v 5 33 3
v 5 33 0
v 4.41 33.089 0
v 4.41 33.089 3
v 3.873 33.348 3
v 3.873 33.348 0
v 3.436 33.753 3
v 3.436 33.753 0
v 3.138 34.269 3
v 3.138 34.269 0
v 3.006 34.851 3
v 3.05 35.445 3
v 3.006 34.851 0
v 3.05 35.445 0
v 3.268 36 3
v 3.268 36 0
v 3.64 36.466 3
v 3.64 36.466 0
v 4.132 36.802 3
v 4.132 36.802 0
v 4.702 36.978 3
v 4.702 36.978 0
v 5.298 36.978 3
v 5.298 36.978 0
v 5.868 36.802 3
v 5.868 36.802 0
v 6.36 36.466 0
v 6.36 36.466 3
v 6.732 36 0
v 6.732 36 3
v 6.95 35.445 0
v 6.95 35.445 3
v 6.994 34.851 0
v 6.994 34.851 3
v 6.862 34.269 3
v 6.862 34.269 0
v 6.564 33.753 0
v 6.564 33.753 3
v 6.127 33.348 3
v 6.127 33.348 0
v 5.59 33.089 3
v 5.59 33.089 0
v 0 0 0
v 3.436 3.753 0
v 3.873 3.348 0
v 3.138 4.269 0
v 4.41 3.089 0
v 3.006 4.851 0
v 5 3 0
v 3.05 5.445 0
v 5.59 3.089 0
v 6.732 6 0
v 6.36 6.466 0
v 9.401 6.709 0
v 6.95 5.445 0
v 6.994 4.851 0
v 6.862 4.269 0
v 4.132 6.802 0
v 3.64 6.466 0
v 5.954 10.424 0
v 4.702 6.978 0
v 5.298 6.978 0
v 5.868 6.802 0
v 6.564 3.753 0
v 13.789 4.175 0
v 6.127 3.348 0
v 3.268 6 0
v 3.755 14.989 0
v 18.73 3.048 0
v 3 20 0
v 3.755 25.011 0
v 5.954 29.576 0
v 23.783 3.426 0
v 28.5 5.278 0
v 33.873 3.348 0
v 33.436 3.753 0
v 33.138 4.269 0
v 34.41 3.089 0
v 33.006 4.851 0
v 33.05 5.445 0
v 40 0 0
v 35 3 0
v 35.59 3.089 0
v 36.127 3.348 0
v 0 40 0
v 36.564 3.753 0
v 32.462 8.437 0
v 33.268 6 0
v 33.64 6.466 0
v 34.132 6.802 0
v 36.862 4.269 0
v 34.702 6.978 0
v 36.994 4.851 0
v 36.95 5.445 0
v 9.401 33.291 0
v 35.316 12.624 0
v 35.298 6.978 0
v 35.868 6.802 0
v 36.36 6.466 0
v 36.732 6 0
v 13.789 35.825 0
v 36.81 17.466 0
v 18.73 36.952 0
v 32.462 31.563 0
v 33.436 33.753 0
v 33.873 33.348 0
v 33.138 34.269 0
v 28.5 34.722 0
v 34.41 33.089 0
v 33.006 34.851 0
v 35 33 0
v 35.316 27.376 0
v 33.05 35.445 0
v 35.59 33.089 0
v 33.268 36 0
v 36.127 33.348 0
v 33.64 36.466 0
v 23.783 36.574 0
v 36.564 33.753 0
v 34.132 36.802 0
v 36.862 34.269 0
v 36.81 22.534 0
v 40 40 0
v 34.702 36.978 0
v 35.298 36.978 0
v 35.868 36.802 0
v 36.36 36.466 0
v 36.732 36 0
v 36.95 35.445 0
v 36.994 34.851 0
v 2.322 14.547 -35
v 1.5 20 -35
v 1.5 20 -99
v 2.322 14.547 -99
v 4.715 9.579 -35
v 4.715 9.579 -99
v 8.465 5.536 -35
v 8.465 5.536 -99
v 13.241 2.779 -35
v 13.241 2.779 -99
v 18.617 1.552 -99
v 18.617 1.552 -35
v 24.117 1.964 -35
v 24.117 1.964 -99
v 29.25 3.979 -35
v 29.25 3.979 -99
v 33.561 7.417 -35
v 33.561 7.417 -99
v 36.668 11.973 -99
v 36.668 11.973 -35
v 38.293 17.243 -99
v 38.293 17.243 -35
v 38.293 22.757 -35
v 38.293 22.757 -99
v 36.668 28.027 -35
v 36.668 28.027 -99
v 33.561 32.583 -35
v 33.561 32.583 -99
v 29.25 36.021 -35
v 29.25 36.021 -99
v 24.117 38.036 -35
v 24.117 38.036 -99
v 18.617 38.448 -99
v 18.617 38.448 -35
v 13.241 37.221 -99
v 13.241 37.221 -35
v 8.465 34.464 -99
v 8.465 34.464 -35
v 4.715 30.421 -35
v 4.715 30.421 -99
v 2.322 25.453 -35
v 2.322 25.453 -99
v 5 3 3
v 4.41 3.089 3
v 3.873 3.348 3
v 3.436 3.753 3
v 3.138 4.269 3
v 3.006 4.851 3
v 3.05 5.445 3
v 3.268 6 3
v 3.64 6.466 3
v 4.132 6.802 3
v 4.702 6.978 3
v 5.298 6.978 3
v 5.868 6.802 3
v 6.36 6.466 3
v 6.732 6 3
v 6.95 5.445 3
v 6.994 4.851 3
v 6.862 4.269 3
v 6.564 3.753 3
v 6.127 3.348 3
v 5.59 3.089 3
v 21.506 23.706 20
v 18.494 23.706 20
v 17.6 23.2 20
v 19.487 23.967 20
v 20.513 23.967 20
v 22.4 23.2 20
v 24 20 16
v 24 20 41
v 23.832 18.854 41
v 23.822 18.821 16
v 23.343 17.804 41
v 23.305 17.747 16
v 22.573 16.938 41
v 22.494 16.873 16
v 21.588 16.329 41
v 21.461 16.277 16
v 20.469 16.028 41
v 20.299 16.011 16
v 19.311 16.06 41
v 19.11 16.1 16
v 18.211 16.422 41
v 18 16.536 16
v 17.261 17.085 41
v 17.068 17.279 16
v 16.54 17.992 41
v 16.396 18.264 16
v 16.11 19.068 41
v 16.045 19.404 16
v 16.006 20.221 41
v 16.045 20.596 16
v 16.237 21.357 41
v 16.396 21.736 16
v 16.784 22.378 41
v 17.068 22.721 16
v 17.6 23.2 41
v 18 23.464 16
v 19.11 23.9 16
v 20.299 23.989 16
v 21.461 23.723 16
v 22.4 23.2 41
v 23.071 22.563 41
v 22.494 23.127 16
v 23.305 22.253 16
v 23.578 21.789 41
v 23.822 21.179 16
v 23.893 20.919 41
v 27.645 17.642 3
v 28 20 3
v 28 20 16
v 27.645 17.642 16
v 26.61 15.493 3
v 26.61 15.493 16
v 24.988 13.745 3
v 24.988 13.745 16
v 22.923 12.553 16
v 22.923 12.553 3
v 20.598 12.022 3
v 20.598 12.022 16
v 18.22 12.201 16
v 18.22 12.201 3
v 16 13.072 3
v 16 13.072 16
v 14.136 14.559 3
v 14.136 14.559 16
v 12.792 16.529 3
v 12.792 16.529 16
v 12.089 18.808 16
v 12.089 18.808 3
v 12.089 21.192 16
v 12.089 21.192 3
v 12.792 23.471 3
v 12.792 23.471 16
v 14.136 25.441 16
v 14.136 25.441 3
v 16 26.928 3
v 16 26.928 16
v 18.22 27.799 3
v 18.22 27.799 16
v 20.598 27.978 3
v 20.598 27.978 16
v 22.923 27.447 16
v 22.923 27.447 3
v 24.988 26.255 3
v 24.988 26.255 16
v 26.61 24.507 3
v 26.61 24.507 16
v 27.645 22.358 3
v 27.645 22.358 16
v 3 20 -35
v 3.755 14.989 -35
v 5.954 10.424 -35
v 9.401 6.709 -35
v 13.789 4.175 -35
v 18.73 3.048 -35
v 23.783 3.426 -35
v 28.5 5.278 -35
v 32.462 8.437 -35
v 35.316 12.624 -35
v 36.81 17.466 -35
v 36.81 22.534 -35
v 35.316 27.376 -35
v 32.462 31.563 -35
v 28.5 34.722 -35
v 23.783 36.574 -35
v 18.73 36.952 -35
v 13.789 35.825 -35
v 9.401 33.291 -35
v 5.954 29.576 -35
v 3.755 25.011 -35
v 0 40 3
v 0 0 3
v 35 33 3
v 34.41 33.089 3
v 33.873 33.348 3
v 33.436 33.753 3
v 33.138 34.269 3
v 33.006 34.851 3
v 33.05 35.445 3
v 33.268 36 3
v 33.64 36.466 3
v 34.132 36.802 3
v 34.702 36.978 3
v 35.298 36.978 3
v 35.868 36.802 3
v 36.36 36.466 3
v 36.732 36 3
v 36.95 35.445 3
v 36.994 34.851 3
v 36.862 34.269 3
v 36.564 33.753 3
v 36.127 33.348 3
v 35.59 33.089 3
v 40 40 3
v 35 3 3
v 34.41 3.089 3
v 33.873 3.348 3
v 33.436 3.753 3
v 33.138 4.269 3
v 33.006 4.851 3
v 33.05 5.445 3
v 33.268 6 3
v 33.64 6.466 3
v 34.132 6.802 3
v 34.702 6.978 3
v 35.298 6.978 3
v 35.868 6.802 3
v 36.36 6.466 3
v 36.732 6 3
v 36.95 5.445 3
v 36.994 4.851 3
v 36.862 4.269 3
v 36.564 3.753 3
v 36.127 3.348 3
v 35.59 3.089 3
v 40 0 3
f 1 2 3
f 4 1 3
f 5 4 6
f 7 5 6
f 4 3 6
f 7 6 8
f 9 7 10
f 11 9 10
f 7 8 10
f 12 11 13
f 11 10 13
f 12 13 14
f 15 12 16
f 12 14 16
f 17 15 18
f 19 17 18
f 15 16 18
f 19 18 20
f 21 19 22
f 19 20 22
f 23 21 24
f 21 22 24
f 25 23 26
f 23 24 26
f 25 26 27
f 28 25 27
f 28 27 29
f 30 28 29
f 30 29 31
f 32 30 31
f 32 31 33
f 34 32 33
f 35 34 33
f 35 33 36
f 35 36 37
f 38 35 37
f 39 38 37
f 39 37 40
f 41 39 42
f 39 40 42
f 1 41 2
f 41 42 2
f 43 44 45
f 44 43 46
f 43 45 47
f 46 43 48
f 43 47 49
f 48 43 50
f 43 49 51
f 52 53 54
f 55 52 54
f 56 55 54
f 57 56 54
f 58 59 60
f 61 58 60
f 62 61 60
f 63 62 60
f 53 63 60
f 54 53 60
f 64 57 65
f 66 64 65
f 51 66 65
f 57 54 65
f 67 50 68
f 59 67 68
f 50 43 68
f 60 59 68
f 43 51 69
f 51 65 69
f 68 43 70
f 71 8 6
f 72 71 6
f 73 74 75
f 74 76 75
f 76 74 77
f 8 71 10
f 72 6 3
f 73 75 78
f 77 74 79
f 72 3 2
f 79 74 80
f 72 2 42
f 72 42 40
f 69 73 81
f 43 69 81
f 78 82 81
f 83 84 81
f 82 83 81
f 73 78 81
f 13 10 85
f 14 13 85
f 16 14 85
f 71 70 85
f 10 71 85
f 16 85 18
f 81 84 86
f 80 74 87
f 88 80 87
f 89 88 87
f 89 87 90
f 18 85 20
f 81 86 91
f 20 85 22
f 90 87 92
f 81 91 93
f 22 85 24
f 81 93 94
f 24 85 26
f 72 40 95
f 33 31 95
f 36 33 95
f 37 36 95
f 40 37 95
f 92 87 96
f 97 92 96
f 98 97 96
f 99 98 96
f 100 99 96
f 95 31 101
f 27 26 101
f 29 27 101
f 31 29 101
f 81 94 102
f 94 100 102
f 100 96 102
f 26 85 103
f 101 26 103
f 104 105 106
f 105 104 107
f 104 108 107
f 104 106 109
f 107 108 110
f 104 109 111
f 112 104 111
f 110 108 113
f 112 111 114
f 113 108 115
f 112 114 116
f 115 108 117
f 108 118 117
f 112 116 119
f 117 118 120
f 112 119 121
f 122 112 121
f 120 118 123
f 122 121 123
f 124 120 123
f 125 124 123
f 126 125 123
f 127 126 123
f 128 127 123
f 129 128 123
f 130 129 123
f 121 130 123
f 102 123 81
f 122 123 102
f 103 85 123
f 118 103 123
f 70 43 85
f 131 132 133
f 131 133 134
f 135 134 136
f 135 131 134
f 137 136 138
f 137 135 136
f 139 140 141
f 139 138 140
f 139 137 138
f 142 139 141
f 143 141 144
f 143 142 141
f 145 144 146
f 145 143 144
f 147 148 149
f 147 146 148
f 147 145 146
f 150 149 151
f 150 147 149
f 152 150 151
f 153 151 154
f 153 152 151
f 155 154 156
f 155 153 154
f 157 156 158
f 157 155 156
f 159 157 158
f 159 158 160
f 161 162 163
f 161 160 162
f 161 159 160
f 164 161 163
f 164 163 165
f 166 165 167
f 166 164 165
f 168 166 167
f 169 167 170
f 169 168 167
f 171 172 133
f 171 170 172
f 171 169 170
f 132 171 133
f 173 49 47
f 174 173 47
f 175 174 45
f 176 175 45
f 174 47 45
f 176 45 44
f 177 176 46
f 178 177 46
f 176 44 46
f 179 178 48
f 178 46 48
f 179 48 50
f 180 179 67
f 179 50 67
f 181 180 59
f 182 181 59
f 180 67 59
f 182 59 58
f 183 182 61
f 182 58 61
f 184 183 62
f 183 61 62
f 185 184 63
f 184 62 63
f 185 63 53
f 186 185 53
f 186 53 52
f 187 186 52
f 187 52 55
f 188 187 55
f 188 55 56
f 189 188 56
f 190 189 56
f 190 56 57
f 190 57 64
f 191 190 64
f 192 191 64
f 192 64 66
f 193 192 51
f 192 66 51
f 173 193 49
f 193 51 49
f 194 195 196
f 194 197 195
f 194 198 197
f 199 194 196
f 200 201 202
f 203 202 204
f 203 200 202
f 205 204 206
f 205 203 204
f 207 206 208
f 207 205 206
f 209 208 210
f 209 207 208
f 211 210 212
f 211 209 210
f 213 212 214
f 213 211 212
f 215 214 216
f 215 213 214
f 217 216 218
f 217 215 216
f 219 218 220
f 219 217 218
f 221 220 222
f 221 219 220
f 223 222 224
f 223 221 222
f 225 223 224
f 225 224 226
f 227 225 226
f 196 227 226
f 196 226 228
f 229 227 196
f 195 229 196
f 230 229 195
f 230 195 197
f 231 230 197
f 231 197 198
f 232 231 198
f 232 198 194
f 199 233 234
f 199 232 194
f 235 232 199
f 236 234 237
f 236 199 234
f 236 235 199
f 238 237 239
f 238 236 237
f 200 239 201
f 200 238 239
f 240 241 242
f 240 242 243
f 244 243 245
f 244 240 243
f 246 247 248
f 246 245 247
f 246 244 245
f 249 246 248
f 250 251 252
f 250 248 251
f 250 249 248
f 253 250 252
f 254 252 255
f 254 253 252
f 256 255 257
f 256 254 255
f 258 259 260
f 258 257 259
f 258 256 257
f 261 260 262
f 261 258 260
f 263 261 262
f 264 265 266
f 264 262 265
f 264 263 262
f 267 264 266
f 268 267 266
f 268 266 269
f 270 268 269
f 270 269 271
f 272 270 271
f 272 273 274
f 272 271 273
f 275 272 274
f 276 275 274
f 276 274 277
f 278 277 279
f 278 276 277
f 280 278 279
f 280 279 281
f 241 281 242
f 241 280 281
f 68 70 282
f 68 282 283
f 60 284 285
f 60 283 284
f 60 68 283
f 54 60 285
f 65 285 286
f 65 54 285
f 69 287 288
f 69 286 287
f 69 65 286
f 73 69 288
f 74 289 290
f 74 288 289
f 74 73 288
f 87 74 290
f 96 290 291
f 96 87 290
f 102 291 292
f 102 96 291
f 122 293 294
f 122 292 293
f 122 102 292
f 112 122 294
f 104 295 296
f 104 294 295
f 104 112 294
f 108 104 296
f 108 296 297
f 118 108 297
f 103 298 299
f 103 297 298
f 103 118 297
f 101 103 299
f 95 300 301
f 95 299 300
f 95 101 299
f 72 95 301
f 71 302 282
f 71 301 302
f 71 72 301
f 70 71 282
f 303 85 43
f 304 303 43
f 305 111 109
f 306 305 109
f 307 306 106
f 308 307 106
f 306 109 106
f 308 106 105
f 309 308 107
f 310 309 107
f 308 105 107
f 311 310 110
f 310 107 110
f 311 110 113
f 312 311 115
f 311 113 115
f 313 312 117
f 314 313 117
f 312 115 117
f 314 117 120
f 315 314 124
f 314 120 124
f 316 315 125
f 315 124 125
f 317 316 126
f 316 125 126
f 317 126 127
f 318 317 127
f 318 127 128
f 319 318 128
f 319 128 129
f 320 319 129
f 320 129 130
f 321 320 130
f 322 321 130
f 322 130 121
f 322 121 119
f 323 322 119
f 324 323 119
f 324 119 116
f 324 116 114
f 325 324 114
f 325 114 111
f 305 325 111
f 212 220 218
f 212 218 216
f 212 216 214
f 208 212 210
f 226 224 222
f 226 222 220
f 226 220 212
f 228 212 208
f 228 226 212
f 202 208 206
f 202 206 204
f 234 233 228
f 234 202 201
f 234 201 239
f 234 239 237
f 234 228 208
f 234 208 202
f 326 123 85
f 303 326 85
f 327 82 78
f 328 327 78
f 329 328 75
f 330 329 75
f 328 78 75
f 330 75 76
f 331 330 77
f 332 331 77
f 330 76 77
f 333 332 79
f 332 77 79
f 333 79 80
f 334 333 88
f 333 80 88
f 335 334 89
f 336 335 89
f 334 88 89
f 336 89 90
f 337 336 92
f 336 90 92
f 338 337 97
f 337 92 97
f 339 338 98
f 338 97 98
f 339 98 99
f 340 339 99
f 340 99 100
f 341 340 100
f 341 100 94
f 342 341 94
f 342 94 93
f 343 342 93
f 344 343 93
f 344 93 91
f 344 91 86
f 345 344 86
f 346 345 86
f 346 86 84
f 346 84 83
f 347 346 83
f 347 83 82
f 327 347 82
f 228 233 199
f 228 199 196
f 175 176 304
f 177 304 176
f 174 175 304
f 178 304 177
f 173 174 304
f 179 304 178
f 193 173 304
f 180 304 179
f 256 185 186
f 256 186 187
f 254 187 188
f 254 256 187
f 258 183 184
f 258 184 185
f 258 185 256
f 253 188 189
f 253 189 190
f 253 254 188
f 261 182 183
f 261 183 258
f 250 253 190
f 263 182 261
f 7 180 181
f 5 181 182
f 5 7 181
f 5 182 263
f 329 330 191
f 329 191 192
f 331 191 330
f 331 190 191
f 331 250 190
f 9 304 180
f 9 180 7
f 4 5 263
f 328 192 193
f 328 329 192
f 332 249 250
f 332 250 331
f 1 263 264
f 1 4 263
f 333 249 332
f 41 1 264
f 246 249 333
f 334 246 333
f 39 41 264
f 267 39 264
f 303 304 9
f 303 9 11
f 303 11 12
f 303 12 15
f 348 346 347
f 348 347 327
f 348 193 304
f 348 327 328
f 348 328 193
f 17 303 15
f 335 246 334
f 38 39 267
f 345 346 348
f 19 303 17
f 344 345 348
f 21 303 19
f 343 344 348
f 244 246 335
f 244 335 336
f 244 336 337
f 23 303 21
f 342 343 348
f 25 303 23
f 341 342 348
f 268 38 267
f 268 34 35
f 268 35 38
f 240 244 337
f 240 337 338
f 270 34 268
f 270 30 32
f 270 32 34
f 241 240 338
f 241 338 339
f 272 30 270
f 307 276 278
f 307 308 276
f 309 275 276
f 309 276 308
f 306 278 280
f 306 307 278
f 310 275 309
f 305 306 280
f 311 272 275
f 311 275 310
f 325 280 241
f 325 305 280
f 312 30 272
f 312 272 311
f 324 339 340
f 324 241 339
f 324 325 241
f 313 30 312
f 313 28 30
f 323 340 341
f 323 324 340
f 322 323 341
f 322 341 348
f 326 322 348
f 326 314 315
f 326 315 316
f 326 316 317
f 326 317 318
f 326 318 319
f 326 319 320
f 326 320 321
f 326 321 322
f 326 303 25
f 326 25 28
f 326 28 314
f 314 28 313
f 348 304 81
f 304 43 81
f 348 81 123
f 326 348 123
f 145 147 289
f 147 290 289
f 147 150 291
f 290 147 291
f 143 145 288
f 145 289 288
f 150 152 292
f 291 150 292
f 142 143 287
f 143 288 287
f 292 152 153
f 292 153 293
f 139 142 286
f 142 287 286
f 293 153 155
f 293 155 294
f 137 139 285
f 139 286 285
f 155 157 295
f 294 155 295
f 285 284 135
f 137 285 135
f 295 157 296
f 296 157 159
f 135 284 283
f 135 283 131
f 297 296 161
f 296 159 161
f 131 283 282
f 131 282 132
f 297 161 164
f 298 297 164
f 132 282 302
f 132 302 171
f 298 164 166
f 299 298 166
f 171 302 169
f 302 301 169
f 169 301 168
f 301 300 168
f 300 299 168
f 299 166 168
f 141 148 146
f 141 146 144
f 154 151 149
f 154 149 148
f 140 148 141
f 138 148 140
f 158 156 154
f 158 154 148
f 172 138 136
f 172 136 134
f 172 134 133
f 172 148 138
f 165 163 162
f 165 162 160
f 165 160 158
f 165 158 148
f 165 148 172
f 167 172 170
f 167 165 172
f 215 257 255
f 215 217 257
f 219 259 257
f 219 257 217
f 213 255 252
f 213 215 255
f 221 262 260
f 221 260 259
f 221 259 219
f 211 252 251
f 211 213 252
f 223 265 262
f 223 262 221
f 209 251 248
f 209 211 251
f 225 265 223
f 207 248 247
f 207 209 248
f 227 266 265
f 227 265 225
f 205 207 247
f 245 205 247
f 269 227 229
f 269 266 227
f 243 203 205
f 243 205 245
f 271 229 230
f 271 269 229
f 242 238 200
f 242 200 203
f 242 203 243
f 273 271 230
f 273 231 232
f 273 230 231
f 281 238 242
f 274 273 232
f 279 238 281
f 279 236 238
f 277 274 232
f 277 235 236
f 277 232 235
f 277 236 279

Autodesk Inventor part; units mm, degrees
ref_plane "YZ Plane" through (0, 0, 0) normal (1, 0, 0) x (0, 1, 0)
ref_plane "XZ Plane" through (0, 0, 0) normal (0, 1, 0) x (-1, 0, 0)
ref_plane "XY Plane" through (0, 0, 0) normal (0, 0, 1) x (1, 0, 0)
sketch "Sketch1" plane through (0, 0, 0) normal (0, 0, 1) x (1, 0, 0)
  line L0 (0, 0) -> (40, 0)
  line L1 (40, 0) -> (40, 40)
  line L2 (40, 40) -> (0, 40)
  line L3 (0, 40) -> (0, 0)
  dimension "d0" = 40
  dimension "d1" = 40
extrude "Extrusion1" add sketch "Sketch1" along normal blind 3
sketch "Sketch2" plane through (0, 0, 3) normal (0, 0, 1) x (1, 0, 0)
  line L0 (40, 0) -> (0, 0) projected
  line L1 (40, 40) -> (40, 0) projected
  line L2 (35, 5) -> (5, 5)
  line L3 (5, 5) -> (5, 35)
  line L4 (5, 35) -> (35, 35)
  line L5 (35, 35) -> (35, 5)
  circle A0 centre (20, 20) radius 8
  dimension "d4" = 30
  dimension "d5" = 30
  dimension "d6" = 5
  dimension "d7" = 5
  dimension "d8" = 16
extrude "Extrusion2" add sketch "Sketch2" along normal blind 13 contours A0
sketch "Sketch3" plane through (0, 0, 3) normal (0, 0, 1) x (1, 0, 0)
  line L0 (40, 0) -> (0, 0) projected
  line L1 (40, 40) -> (40, 0) projected
  line L2 (5, 5) -> (35, 5)
  line L3 (35, 5) -> (35, 35)
  line L4 (35, 35) -> (5, 35)
  line L5 (5, 35) -> (5, 5)
  dimension "d11" = 30
  dimension "d12" = 30
  dimension "d13" = 5
  dimension "d14" = 5
hole "Hole1" at (5, 5, 3) at (35, 5, 3) at (35, 35, 3) at (5, 35, 3) direction (0, 0, -1) diameter 4 end through all
sketch "Sketch4" plane through (20, 20, 16) normal (0, 0, 1) x (1, 0, 0)
  circle A0 centre (0, 0) radius 8 projected
  circle A1 centre (0, 0) radius 4
  point P0 (-20, -20)
  dimension "d22" = 8
extrude "Extrusion3" add sketch "Sketch4" along normal blind 25 contours A1
sketch "Sketch5" plane through (20, 20, 41) normal (0, 0, 1) x (1, 0, 0)
  circle A0 centre (0, 0) radius 4 projected
  line L0 (-4, 0) -> (4, 0)
  line L1 (4, 0) -> (4, 4)
  line L2 (4, 4) -> (-4, 4)
  line L3 (-4, 4) -> (-4, 0)
  line L4 (-4, 4) -> (4, 4)
  line L5 (4, 4) -> (4, 3.2)
  line L6 (4, 3.2) -> (-4, 3.2)
  line L7 (-4, 3.2) -> (-4, 4)
  point P0 (-20, -20)
  dimension "d25" = 0.8
extrude "Extrusion4" cut sketch "Sketch5" against normal blind 21 contours L6 L3 L2 A0 | A0 L6 | A0 L2 L1 L6
sketch "Sketch6" plane through (0, 0, 0) normal (0, 0, -1) x (-1, 0, 0)
  circle A0 centre (-20, 20) radius 17
  dimension "d28" = 34
extrude "Extrusion5" add sketch "Sketch6" along normal blind 35
sketch "Sketch7" plane through (20, 20, -35) normal (0, 0, -1) x (-1, 0, 0)
  circle A0 centre (0, 0) radius 17 projected
  circle A1 centre (0, 0) radius 18.5
  point P0 (20, -20)
  dimension "d31" = 37
extrude "Extrusion6" add sketch "Sketch7" along normal blind 64 contours A0 | A1
properties part number "mr85vel 3 etapas" material "UHMW, White"
